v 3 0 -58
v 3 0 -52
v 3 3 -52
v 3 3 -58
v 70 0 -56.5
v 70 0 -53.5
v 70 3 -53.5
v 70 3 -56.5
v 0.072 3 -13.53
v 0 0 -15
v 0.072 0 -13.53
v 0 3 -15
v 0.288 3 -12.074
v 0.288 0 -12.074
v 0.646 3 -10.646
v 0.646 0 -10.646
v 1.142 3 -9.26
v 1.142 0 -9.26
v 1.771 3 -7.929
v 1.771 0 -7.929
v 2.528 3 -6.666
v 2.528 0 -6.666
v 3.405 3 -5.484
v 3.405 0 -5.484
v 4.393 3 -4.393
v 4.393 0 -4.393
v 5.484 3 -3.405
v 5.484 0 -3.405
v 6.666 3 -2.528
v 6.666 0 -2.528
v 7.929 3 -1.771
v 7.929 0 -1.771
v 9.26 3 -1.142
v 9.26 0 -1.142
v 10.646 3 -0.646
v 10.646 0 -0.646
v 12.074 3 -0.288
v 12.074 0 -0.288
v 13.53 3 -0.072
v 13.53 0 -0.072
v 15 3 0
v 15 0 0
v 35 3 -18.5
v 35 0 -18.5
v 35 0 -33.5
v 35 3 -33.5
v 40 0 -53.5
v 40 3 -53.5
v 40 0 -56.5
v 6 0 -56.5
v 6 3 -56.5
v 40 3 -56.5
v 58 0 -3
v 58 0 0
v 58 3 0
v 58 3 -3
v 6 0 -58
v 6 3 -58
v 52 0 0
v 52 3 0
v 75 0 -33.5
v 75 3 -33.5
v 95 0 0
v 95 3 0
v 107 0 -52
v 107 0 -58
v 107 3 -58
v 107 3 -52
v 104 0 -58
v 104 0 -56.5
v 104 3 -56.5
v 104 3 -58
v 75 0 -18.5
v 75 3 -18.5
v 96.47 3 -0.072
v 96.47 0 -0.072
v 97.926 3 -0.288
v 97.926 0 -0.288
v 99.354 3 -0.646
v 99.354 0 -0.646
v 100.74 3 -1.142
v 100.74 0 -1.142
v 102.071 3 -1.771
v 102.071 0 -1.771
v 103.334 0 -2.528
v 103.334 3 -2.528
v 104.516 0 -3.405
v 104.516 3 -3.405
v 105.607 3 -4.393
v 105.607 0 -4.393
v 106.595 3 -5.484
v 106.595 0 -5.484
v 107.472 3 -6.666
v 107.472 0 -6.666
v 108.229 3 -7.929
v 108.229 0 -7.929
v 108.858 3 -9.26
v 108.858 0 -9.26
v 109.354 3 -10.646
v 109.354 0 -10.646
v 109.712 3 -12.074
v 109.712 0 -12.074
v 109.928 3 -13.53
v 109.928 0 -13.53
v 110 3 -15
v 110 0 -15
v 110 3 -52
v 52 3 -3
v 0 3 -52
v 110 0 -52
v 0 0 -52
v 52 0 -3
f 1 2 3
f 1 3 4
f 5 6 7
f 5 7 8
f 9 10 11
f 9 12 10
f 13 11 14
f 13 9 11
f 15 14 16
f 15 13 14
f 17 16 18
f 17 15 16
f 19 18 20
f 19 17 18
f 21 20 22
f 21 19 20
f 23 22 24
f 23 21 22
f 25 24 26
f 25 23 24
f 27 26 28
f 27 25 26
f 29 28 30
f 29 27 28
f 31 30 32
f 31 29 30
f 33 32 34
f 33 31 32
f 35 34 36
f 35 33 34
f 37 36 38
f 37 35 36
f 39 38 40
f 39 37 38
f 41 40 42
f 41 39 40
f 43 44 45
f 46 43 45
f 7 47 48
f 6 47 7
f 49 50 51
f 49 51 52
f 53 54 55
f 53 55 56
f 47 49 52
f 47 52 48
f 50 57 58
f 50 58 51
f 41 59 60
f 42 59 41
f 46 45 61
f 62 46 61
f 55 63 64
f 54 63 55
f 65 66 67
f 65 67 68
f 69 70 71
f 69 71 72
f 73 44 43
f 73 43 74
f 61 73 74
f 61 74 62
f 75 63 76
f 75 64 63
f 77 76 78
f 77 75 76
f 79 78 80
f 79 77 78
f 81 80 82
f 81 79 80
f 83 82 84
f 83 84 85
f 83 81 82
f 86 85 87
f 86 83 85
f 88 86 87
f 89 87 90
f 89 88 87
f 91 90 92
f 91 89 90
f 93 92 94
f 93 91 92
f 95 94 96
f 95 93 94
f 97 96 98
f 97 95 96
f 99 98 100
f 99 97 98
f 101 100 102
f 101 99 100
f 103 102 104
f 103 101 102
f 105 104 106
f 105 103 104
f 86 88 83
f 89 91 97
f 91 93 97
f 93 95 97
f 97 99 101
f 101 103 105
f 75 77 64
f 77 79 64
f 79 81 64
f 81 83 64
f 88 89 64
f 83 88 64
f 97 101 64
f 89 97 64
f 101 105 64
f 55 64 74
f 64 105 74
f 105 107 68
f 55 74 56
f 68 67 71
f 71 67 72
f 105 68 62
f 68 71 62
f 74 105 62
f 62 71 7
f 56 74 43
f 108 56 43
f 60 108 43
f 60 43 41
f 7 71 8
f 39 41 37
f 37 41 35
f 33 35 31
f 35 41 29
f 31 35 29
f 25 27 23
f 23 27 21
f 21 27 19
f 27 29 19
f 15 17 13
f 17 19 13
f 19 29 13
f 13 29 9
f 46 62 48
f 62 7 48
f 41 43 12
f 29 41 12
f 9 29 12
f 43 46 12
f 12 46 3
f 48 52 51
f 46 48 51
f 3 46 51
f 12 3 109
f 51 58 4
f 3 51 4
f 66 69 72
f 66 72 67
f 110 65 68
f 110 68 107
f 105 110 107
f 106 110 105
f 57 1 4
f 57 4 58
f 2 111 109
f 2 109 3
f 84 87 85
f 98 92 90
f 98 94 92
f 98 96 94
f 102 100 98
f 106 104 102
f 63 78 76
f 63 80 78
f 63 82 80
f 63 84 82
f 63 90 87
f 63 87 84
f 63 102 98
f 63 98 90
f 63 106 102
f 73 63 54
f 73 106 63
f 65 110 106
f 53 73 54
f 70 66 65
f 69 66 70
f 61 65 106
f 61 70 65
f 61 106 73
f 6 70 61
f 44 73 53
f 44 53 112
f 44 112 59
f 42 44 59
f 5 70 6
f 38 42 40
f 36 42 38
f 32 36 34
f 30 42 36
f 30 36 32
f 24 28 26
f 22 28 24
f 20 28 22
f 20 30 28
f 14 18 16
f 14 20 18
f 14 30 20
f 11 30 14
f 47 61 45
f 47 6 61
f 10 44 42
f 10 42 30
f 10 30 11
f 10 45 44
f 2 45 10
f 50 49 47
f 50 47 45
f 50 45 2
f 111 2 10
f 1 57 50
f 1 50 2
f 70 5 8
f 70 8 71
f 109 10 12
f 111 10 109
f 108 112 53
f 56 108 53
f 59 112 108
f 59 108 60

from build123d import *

# Parameters (mm, degrees)
SKETCH_3_W      = 40
SKETCH_3_H      = 15
EXTRUDE_2_DEPTH = 3
FILLET1_R       = 15


with BuildPart() as part:
    # Эскиз3 → Бобышка-Вытянуть2 (new body)
    with BuildSketch(Plane(origin=(0, 0, 0), x_dir=(1, 0, 0), z_dir=(0, 1, 0))):
        Polygon((0, 52), (3, 52), (3, 58), (6, 58), (6, 56.5), (40, 56.5), (40, 53.5), (70, 53.5), (70, 56.5), (104, 56.5), (104, 58), (107, 58), (107, 52), (110, 52), (110, 0), (58, 0), (58, 3), (55, 3), (52, 3), (52, 0), (0, 0), align=None)
        with Locations((55, 26)):
            Rectangle(SKETCH_3_W, SKETCH_3_H, mode=Mode.SUBTRACT)
    extrude(amount=EXTRUDE_2_DEPTH)

    # Fillet1
    fillet1_edges = [part.edges().sort_by_distance(p)[0] for p in [
        (110, 1.5, 0),
        (0, 1.5, 0),
    ]]
    fillet(fillet1_edges, radius=FILLET1_R)


solid = part.part
